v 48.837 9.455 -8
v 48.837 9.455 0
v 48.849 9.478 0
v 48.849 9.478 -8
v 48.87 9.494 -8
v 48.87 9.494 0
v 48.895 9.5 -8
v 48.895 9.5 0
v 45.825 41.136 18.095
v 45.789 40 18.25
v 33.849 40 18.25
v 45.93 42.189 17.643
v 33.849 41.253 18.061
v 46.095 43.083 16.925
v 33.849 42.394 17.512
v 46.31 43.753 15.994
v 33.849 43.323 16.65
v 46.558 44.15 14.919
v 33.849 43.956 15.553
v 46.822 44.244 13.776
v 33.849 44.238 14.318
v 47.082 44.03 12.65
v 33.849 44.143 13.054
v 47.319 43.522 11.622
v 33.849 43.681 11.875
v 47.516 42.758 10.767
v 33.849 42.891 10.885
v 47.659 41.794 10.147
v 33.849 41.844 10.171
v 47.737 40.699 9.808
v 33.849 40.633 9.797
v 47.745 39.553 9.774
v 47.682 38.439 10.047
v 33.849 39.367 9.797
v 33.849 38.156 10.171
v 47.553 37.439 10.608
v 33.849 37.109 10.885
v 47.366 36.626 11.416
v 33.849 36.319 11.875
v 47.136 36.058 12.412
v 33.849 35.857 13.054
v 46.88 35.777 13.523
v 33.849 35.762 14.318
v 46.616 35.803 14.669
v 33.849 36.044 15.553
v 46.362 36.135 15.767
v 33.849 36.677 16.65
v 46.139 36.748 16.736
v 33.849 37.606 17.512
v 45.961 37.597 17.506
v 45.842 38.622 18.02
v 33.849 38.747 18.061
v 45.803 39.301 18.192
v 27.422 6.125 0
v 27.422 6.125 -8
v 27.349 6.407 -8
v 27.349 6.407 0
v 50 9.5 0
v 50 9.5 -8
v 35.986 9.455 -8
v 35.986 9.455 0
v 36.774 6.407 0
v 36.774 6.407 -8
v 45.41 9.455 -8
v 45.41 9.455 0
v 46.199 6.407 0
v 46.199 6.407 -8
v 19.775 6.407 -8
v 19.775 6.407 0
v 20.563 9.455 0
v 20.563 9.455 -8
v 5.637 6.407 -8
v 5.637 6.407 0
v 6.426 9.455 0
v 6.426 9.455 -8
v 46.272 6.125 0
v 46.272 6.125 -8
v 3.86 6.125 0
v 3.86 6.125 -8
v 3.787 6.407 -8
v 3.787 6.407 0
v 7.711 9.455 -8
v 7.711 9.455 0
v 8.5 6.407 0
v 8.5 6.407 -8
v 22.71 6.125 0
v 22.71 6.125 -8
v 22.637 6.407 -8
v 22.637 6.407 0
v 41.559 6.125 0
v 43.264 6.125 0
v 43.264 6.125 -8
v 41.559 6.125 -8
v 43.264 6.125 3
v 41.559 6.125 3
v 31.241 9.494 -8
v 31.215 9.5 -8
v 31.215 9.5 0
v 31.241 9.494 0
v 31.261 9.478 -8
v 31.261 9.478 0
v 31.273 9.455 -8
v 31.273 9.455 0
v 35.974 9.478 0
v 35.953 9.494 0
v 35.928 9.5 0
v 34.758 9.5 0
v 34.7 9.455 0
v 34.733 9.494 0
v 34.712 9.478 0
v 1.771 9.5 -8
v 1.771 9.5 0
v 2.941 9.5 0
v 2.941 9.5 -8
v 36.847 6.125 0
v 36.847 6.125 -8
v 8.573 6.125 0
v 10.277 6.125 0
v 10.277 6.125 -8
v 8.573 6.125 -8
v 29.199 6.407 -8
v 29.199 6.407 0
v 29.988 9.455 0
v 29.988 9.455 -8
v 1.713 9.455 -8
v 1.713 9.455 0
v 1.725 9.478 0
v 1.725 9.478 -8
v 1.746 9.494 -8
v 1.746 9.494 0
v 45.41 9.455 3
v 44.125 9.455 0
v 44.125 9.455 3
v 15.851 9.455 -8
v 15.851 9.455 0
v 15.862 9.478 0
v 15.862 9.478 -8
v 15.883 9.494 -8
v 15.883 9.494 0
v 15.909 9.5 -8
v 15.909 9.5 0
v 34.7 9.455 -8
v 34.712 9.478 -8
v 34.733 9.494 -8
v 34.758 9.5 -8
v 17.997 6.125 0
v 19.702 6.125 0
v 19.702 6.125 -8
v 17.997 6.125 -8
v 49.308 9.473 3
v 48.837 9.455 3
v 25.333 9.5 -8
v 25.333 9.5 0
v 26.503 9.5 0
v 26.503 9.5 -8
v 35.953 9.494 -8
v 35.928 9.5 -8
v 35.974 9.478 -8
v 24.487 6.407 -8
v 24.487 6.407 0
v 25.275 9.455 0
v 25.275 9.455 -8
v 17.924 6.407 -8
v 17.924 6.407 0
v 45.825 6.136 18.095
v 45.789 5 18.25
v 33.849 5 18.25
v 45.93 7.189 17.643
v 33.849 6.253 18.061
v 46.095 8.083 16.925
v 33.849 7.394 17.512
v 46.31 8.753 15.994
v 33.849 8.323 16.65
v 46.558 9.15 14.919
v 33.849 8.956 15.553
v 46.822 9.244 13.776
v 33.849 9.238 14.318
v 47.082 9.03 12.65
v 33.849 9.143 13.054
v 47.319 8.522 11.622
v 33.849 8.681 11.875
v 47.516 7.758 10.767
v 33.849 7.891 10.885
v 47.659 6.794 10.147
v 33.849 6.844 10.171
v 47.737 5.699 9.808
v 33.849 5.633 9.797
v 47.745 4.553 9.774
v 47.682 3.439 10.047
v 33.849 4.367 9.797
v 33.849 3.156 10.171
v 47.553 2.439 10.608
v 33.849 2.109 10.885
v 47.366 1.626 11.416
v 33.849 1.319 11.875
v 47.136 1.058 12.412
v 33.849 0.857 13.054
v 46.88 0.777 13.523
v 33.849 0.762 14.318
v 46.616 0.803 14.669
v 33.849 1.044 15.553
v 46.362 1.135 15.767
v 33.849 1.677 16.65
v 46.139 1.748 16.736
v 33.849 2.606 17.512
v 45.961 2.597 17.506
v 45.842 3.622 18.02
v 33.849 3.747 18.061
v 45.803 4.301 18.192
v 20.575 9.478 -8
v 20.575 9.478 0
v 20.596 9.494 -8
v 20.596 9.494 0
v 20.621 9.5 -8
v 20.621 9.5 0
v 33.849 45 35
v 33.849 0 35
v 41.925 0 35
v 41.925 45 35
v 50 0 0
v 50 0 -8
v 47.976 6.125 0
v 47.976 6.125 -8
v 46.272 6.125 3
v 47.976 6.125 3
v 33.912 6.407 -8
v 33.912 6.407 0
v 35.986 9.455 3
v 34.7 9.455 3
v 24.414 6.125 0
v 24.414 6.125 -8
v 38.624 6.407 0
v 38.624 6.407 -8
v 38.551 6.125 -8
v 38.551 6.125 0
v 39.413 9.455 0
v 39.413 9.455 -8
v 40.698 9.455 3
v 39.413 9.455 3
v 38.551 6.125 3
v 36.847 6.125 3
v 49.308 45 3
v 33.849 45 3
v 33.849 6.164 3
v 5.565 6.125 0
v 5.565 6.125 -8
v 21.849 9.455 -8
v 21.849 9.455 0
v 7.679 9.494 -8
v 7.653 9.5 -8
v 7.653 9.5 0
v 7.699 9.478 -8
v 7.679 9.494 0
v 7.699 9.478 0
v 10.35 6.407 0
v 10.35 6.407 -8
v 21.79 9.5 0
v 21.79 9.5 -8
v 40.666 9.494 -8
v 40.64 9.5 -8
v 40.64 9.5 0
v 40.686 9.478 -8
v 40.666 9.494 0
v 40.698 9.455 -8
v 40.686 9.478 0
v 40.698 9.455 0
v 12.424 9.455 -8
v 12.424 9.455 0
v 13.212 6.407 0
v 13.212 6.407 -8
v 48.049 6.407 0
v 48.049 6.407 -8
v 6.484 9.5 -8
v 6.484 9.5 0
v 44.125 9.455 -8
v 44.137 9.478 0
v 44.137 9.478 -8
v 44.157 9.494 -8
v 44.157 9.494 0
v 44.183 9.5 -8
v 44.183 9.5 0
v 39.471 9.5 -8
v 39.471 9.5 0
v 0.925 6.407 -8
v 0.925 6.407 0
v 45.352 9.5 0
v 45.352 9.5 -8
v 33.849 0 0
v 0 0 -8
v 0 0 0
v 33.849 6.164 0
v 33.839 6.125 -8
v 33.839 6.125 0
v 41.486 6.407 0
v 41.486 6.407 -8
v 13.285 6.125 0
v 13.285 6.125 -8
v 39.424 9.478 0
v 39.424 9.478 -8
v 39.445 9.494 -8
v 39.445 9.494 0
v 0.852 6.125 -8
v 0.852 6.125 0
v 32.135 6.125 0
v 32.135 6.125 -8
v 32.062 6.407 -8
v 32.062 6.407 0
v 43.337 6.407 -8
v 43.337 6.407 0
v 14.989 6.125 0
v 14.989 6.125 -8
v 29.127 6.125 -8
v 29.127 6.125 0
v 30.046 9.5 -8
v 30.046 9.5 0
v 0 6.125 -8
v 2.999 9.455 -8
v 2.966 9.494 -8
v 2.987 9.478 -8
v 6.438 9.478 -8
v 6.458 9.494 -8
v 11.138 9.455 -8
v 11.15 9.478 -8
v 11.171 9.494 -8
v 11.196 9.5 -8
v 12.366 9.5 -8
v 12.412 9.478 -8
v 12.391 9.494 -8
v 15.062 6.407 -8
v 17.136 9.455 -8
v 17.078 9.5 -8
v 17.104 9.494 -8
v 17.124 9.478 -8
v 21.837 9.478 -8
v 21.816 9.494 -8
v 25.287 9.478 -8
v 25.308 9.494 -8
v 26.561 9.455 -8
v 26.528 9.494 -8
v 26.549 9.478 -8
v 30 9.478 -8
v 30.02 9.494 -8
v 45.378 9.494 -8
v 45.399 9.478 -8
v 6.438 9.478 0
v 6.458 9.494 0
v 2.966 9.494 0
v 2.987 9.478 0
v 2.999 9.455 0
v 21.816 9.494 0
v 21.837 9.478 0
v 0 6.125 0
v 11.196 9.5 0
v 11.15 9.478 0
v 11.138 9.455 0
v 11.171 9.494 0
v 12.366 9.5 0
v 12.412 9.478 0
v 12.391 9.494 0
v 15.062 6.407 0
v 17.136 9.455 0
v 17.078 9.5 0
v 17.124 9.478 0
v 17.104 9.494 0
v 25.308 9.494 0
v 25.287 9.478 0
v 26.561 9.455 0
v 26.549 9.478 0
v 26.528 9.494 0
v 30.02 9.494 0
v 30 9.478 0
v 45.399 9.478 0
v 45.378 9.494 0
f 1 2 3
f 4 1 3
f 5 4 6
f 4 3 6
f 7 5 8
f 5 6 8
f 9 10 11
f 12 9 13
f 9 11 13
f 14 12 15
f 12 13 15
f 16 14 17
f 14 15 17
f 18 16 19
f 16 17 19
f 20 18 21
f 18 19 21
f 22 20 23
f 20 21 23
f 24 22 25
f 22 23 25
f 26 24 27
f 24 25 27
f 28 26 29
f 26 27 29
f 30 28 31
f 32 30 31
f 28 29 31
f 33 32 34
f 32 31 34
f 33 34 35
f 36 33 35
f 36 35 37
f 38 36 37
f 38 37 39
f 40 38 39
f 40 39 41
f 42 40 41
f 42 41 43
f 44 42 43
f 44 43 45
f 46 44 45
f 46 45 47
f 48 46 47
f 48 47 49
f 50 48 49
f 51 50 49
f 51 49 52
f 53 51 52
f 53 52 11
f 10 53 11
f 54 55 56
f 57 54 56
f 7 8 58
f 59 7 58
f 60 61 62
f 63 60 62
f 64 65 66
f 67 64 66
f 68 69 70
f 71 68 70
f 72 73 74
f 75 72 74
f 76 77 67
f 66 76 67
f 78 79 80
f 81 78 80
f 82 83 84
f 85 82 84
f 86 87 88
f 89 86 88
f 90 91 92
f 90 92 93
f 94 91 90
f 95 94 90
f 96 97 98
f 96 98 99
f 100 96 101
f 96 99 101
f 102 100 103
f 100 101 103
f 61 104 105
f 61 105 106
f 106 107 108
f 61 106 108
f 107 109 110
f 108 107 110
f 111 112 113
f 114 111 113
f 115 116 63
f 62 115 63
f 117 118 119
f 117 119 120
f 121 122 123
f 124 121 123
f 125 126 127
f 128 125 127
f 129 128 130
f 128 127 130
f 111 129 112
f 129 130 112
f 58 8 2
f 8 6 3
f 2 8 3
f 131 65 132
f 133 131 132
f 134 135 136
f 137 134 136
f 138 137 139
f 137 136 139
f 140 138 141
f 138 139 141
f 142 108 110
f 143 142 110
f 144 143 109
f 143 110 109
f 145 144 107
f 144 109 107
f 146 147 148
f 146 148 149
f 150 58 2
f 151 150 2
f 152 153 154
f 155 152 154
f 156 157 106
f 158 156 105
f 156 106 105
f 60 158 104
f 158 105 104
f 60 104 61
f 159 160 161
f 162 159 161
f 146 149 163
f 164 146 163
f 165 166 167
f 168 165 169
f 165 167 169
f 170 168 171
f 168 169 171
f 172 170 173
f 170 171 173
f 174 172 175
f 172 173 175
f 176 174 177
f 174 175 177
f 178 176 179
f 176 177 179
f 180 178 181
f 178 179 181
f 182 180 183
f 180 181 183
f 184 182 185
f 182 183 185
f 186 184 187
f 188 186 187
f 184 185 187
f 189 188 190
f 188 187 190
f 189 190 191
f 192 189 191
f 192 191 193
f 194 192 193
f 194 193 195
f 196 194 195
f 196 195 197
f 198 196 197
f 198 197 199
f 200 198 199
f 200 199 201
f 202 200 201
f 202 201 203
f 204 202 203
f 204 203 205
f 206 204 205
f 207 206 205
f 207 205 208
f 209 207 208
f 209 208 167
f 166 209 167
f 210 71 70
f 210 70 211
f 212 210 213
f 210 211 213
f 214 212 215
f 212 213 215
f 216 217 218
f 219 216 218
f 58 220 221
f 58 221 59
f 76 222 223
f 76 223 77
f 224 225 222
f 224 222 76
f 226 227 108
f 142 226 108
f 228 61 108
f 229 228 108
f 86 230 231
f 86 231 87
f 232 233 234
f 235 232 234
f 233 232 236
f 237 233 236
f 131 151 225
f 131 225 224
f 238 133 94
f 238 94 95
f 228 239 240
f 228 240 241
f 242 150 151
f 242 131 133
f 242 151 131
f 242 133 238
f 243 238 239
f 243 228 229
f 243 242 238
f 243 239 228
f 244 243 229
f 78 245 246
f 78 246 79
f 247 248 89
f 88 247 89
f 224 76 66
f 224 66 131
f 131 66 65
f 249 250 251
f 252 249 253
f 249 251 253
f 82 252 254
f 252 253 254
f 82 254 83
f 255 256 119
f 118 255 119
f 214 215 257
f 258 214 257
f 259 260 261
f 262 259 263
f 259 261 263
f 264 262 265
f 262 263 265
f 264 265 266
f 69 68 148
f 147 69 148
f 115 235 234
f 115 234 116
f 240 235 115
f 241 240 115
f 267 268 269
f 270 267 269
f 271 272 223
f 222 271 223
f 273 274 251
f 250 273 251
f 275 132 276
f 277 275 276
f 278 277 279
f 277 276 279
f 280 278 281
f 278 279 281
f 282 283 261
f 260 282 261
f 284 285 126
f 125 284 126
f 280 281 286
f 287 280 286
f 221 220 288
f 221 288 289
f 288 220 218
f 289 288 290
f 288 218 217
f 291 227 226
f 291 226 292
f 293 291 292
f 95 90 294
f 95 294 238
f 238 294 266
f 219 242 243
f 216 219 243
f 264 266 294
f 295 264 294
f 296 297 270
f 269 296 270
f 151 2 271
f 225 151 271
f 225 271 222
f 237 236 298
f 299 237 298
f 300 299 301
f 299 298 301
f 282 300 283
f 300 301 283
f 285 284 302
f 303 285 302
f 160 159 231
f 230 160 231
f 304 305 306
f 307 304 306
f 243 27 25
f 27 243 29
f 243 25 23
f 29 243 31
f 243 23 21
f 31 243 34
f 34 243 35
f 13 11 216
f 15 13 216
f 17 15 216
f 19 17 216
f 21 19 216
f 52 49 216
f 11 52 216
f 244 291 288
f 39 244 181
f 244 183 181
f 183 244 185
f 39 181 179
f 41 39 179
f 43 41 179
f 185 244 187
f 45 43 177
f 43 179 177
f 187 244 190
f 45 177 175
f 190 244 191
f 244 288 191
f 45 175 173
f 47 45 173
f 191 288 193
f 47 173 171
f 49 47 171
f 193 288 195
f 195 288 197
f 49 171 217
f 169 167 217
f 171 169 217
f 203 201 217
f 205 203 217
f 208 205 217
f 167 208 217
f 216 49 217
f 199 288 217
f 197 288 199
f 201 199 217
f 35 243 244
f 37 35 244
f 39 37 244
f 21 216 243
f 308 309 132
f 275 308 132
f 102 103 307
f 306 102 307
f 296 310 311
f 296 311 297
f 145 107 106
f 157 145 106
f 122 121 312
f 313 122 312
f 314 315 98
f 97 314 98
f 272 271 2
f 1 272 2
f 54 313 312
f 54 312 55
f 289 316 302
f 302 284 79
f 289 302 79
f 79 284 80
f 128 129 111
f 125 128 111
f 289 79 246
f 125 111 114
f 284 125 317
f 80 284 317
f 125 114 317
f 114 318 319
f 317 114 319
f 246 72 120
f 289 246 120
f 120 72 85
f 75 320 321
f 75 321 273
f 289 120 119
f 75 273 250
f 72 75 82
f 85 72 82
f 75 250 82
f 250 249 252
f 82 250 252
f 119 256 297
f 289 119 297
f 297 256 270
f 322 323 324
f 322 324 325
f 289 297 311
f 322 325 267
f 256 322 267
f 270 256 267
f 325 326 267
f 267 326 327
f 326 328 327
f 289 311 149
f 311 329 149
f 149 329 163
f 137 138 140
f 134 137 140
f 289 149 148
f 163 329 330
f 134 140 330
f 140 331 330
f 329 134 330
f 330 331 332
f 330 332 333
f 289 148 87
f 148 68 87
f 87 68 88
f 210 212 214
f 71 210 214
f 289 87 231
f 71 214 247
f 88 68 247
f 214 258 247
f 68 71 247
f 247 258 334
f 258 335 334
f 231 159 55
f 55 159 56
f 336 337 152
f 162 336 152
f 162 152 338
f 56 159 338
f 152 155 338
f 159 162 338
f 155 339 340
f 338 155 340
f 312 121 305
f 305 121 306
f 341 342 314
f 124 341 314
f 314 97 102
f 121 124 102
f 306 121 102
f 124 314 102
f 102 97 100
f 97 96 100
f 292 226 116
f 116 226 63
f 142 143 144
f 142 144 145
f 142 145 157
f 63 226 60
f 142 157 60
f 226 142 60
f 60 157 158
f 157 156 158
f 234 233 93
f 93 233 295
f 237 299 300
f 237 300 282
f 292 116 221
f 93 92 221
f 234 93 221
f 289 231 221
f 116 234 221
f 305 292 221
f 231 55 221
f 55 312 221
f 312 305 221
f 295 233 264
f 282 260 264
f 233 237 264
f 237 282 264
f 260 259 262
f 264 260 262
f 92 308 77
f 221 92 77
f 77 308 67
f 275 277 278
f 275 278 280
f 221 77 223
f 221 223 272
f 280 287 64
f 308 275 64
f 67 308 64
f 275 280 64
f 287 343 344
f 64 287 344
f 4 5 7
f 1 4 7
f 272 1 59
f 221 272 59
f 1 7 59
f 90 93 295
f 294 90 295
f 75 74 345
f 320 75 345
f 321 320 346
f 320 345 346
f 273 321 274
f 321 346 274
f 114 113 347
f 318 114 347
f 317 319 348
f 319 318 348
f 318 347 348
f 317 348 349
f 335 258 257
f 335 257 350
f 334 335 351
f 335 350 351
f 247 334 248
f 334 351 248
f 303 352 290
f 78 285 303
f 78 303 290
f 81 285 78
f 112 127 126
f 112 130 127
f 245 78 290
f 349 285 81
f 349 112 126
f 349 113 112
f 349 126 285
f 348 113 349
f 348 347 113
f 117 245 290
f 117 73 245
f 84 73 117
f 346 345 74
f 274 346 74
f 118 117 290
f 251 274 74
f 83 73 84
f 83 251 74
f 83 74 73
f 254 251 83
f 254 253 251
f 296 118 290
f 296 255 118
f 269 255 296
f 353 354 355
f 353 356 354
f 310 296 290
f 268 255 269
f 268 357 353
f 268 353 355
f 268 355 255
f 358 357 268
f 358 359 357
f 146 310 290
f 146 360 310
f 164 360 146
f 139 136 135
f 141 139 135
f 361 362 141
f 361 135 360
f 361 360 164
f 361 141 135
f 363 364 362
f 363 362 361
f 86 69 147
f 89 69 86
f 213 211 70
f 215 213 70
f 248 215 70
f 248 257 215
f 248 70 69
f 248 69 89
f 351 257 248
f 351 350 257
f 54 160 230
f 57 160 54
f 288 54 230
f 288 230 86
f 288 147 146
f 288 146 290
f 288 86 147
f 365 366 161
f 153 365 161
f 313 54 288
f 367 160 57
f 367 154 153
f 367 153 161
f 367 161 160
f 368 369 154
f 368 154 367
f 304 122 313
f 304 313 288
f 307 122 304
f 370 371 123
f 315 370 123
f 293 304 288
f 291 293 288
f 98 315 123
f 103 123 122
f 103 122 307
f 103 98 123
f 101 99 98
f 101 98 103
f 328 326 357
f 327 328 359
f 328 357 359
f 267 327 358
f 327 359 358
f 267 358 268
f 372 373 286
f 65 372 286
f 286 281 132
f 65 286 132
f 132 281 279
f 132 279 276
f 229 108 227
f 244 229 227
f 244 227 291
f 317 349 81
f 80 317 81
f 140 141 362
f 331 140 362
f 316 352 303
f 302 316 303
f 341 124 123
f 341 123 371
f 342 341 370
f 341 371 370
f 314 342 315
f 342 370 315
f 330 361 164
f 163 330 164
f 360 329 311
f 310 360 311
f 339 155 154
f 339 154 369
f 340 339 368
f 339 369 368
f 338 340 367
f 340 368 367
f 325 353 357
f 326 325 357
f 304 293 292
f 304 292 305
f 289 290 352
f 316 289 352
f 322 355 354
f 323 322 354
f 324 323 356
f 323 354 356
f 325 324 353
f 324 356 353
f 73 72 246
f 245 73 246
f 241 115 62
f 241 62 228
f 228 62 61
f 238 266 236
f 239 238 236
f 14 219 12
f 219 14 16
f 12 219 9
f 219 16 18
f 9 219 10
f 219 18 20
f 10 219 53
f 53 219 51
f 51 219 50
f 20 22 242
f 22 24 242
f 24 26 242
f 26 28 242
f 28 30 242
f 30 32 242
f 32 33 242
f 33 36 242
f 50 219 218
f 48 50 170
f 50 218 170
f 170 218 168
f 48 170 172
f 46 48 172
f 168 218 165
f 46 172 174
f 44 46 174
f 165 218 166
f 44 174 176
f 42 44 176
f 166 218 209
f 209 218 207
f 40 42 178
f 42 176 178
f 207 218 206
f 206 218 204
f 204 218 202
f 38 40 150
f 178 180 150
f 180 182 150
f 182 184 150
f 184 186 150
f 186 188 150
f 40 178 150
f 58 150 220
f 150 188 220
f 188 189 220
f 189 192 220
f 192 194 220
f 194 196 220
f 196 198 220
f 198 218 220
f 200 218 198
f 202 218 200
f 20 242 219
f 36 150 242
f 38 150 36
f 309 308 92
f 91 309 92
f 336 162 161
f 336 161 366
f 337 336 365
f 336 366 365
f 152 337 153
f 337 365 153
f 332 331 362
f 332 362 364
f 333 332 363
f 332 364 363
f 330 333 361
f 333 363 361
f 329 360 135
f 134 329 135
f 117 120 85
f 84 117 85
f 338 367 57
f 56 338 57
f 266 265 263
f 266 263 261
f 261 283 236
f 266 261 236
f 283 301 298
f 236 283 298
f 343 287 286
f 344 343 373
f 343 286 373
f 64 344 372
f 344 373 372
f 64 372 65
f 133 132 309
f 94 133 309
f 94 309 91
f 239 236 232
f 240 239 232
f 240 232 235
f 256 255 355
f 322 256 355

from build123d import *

# Parameters (mm, degrees)
BLANKSKE_W          = 50
BLANKSKE_H          = 9.5
BLANK_DEPTH         = 8
TOOTHCUTILL_DEPTH   = 52.519413817
TOOTHCUTSIM_DEPTH   = 52.519413817
TEETHCUTS_COUNT     = 11
TEETHCUTS_PITCH     = 4.712388975
BOSS_EXTRUDE8_DEPTH = 45
CUT_EXTRUDE5_DEPTH  = 3
SKETCH20_R          = 4.25
CUT_EXTRUDE6_DEPTH  = 25


with BuildPart() as part:
    # BlankSke → Blank (new body)
    with BuildSketch(Plane.XY):
        with Locations((25, 4.75)):
            Rectangle(BLANKSKE_W, BLANKSKE_H)
    extrude(amount=-BLANK_DEPTH)

    # TooCutSkeIll → ToothCutIll (cut, through all)
    with BuildSketch(Plane.XY):
        with BuildLine():
            Line((-1.713391726, 9.4550228), (-0.92508248, 6.406857118))
            ThreePointArc((-0.92508248, 6.406857118), (-0.791252665, 6.20370072), (-0.561058967, 6.125))
            Line((-0.561058967, 6.125), (0.561058967, 6.125))
            ThreePointArc((0.561058967, 6.125), (0.791252665, 6.20370072), (0.92508248, 6.406857118))
            Line((0.92508248, 6.406857118), (1.713391726, 9.4550228))
            ThreePointArc((1.713391726, 9.4550228), (1.734747547, 9.487441374), (1.771480584, 9.5))
            Line((1.771480584, 9.5), (1.771480584, 9.5254))
            Line((1.771480584, 9.5254), (-1.771480584, 9.5254))
            Line((-1.771480584, 9.5254), (-1.771480584, 9.5))
            ThreePointArc((-1.771480584, 9.5), (-1.734747547, 9.487441374), (-1.713391726, 9.4550228))
        make_face()
    toothcutill = extrude(amount=-TOOTHCUTILL_DEPTH, mode=Mode.SUBTRACT)

    # TooCutSkeSim → ToothCutSim (cut, through all)
    with BuildSketch(Plane.XY):
        Polygon((0.852189273, 6.125), (-0.852189273, 6.125), (-1.731592507, 9.5254), (1.731592507, 9.5254), align=None)
    toothcutsim = extrude(amount=-TOOTHCUTSIM_DEPTH, mode=Mode.SUBTRACT)

    # TeethCuts: ToothCutIll, ToothCutSim ×11
    with Locations(*[(i * TEETHCUTS_PITCH, 0, 0) for i in range(1, TEETHCUTS_COUNT)]):
        add(toothcutill, mode=Mode.SUBTRACT)
        add(toothcutsim, mode=Mode.SUBTRACT)

    # Sketch16 → Boss-Extrude8 (add)
    with BuildSketch(Plane.XZ):
        Polygon((50, 0), (33.849, 0), (33.849, 35), (41.925, 35), align=None)
    extrude(amount=-BOSS_EXTRUDE8_DEPTH)

    # Sketch17 → Cut-Extrude5 (cut)
    with BuildSketch(Plane(origin=(0, 0, 0), x_dir=(-1, 0, 0), z_dir=(0, 0, -1))):
        Polygon((-50, 9.5), (-48.837281476, 9.4550228), (-47.976079023, 6.125), (-46.271700477, 6.125), (-45.410498024, 9.4550228), (-44.124892501, 9.4550228), (-43.263690048, 6.125), (-41.559311502, 6.125), (-40.698109049, 9.4550228), (-39.412503526, 9.4550228), (-38.551301073, 6.125), (-36.846922527, 6.125), (-35.985720074, 9.4550228), (-34.700114551, 9.4550228), (-33.838912098, 6.125), (-33.849, 45), (-50, 45), align=None)
    extrude(amount=-CUT_EXTRUDE5_DEPTH, mode=Mode.SUBTRACT)

    # Sketch20 → Cut-Extrude6 (cut)
    with BuildSketch(Plane.ZY.offset(-33.849)):
        with Locations((14, 40)):
            Circle(SKETCH20_R)
        with Locations((14, 5)):
            Circle(SKETCH20_R)
    extrude(amount=-CUT_EXTRUDE6_DEPTH, mode=Mode.SUBTRACT)


solid = part.part
